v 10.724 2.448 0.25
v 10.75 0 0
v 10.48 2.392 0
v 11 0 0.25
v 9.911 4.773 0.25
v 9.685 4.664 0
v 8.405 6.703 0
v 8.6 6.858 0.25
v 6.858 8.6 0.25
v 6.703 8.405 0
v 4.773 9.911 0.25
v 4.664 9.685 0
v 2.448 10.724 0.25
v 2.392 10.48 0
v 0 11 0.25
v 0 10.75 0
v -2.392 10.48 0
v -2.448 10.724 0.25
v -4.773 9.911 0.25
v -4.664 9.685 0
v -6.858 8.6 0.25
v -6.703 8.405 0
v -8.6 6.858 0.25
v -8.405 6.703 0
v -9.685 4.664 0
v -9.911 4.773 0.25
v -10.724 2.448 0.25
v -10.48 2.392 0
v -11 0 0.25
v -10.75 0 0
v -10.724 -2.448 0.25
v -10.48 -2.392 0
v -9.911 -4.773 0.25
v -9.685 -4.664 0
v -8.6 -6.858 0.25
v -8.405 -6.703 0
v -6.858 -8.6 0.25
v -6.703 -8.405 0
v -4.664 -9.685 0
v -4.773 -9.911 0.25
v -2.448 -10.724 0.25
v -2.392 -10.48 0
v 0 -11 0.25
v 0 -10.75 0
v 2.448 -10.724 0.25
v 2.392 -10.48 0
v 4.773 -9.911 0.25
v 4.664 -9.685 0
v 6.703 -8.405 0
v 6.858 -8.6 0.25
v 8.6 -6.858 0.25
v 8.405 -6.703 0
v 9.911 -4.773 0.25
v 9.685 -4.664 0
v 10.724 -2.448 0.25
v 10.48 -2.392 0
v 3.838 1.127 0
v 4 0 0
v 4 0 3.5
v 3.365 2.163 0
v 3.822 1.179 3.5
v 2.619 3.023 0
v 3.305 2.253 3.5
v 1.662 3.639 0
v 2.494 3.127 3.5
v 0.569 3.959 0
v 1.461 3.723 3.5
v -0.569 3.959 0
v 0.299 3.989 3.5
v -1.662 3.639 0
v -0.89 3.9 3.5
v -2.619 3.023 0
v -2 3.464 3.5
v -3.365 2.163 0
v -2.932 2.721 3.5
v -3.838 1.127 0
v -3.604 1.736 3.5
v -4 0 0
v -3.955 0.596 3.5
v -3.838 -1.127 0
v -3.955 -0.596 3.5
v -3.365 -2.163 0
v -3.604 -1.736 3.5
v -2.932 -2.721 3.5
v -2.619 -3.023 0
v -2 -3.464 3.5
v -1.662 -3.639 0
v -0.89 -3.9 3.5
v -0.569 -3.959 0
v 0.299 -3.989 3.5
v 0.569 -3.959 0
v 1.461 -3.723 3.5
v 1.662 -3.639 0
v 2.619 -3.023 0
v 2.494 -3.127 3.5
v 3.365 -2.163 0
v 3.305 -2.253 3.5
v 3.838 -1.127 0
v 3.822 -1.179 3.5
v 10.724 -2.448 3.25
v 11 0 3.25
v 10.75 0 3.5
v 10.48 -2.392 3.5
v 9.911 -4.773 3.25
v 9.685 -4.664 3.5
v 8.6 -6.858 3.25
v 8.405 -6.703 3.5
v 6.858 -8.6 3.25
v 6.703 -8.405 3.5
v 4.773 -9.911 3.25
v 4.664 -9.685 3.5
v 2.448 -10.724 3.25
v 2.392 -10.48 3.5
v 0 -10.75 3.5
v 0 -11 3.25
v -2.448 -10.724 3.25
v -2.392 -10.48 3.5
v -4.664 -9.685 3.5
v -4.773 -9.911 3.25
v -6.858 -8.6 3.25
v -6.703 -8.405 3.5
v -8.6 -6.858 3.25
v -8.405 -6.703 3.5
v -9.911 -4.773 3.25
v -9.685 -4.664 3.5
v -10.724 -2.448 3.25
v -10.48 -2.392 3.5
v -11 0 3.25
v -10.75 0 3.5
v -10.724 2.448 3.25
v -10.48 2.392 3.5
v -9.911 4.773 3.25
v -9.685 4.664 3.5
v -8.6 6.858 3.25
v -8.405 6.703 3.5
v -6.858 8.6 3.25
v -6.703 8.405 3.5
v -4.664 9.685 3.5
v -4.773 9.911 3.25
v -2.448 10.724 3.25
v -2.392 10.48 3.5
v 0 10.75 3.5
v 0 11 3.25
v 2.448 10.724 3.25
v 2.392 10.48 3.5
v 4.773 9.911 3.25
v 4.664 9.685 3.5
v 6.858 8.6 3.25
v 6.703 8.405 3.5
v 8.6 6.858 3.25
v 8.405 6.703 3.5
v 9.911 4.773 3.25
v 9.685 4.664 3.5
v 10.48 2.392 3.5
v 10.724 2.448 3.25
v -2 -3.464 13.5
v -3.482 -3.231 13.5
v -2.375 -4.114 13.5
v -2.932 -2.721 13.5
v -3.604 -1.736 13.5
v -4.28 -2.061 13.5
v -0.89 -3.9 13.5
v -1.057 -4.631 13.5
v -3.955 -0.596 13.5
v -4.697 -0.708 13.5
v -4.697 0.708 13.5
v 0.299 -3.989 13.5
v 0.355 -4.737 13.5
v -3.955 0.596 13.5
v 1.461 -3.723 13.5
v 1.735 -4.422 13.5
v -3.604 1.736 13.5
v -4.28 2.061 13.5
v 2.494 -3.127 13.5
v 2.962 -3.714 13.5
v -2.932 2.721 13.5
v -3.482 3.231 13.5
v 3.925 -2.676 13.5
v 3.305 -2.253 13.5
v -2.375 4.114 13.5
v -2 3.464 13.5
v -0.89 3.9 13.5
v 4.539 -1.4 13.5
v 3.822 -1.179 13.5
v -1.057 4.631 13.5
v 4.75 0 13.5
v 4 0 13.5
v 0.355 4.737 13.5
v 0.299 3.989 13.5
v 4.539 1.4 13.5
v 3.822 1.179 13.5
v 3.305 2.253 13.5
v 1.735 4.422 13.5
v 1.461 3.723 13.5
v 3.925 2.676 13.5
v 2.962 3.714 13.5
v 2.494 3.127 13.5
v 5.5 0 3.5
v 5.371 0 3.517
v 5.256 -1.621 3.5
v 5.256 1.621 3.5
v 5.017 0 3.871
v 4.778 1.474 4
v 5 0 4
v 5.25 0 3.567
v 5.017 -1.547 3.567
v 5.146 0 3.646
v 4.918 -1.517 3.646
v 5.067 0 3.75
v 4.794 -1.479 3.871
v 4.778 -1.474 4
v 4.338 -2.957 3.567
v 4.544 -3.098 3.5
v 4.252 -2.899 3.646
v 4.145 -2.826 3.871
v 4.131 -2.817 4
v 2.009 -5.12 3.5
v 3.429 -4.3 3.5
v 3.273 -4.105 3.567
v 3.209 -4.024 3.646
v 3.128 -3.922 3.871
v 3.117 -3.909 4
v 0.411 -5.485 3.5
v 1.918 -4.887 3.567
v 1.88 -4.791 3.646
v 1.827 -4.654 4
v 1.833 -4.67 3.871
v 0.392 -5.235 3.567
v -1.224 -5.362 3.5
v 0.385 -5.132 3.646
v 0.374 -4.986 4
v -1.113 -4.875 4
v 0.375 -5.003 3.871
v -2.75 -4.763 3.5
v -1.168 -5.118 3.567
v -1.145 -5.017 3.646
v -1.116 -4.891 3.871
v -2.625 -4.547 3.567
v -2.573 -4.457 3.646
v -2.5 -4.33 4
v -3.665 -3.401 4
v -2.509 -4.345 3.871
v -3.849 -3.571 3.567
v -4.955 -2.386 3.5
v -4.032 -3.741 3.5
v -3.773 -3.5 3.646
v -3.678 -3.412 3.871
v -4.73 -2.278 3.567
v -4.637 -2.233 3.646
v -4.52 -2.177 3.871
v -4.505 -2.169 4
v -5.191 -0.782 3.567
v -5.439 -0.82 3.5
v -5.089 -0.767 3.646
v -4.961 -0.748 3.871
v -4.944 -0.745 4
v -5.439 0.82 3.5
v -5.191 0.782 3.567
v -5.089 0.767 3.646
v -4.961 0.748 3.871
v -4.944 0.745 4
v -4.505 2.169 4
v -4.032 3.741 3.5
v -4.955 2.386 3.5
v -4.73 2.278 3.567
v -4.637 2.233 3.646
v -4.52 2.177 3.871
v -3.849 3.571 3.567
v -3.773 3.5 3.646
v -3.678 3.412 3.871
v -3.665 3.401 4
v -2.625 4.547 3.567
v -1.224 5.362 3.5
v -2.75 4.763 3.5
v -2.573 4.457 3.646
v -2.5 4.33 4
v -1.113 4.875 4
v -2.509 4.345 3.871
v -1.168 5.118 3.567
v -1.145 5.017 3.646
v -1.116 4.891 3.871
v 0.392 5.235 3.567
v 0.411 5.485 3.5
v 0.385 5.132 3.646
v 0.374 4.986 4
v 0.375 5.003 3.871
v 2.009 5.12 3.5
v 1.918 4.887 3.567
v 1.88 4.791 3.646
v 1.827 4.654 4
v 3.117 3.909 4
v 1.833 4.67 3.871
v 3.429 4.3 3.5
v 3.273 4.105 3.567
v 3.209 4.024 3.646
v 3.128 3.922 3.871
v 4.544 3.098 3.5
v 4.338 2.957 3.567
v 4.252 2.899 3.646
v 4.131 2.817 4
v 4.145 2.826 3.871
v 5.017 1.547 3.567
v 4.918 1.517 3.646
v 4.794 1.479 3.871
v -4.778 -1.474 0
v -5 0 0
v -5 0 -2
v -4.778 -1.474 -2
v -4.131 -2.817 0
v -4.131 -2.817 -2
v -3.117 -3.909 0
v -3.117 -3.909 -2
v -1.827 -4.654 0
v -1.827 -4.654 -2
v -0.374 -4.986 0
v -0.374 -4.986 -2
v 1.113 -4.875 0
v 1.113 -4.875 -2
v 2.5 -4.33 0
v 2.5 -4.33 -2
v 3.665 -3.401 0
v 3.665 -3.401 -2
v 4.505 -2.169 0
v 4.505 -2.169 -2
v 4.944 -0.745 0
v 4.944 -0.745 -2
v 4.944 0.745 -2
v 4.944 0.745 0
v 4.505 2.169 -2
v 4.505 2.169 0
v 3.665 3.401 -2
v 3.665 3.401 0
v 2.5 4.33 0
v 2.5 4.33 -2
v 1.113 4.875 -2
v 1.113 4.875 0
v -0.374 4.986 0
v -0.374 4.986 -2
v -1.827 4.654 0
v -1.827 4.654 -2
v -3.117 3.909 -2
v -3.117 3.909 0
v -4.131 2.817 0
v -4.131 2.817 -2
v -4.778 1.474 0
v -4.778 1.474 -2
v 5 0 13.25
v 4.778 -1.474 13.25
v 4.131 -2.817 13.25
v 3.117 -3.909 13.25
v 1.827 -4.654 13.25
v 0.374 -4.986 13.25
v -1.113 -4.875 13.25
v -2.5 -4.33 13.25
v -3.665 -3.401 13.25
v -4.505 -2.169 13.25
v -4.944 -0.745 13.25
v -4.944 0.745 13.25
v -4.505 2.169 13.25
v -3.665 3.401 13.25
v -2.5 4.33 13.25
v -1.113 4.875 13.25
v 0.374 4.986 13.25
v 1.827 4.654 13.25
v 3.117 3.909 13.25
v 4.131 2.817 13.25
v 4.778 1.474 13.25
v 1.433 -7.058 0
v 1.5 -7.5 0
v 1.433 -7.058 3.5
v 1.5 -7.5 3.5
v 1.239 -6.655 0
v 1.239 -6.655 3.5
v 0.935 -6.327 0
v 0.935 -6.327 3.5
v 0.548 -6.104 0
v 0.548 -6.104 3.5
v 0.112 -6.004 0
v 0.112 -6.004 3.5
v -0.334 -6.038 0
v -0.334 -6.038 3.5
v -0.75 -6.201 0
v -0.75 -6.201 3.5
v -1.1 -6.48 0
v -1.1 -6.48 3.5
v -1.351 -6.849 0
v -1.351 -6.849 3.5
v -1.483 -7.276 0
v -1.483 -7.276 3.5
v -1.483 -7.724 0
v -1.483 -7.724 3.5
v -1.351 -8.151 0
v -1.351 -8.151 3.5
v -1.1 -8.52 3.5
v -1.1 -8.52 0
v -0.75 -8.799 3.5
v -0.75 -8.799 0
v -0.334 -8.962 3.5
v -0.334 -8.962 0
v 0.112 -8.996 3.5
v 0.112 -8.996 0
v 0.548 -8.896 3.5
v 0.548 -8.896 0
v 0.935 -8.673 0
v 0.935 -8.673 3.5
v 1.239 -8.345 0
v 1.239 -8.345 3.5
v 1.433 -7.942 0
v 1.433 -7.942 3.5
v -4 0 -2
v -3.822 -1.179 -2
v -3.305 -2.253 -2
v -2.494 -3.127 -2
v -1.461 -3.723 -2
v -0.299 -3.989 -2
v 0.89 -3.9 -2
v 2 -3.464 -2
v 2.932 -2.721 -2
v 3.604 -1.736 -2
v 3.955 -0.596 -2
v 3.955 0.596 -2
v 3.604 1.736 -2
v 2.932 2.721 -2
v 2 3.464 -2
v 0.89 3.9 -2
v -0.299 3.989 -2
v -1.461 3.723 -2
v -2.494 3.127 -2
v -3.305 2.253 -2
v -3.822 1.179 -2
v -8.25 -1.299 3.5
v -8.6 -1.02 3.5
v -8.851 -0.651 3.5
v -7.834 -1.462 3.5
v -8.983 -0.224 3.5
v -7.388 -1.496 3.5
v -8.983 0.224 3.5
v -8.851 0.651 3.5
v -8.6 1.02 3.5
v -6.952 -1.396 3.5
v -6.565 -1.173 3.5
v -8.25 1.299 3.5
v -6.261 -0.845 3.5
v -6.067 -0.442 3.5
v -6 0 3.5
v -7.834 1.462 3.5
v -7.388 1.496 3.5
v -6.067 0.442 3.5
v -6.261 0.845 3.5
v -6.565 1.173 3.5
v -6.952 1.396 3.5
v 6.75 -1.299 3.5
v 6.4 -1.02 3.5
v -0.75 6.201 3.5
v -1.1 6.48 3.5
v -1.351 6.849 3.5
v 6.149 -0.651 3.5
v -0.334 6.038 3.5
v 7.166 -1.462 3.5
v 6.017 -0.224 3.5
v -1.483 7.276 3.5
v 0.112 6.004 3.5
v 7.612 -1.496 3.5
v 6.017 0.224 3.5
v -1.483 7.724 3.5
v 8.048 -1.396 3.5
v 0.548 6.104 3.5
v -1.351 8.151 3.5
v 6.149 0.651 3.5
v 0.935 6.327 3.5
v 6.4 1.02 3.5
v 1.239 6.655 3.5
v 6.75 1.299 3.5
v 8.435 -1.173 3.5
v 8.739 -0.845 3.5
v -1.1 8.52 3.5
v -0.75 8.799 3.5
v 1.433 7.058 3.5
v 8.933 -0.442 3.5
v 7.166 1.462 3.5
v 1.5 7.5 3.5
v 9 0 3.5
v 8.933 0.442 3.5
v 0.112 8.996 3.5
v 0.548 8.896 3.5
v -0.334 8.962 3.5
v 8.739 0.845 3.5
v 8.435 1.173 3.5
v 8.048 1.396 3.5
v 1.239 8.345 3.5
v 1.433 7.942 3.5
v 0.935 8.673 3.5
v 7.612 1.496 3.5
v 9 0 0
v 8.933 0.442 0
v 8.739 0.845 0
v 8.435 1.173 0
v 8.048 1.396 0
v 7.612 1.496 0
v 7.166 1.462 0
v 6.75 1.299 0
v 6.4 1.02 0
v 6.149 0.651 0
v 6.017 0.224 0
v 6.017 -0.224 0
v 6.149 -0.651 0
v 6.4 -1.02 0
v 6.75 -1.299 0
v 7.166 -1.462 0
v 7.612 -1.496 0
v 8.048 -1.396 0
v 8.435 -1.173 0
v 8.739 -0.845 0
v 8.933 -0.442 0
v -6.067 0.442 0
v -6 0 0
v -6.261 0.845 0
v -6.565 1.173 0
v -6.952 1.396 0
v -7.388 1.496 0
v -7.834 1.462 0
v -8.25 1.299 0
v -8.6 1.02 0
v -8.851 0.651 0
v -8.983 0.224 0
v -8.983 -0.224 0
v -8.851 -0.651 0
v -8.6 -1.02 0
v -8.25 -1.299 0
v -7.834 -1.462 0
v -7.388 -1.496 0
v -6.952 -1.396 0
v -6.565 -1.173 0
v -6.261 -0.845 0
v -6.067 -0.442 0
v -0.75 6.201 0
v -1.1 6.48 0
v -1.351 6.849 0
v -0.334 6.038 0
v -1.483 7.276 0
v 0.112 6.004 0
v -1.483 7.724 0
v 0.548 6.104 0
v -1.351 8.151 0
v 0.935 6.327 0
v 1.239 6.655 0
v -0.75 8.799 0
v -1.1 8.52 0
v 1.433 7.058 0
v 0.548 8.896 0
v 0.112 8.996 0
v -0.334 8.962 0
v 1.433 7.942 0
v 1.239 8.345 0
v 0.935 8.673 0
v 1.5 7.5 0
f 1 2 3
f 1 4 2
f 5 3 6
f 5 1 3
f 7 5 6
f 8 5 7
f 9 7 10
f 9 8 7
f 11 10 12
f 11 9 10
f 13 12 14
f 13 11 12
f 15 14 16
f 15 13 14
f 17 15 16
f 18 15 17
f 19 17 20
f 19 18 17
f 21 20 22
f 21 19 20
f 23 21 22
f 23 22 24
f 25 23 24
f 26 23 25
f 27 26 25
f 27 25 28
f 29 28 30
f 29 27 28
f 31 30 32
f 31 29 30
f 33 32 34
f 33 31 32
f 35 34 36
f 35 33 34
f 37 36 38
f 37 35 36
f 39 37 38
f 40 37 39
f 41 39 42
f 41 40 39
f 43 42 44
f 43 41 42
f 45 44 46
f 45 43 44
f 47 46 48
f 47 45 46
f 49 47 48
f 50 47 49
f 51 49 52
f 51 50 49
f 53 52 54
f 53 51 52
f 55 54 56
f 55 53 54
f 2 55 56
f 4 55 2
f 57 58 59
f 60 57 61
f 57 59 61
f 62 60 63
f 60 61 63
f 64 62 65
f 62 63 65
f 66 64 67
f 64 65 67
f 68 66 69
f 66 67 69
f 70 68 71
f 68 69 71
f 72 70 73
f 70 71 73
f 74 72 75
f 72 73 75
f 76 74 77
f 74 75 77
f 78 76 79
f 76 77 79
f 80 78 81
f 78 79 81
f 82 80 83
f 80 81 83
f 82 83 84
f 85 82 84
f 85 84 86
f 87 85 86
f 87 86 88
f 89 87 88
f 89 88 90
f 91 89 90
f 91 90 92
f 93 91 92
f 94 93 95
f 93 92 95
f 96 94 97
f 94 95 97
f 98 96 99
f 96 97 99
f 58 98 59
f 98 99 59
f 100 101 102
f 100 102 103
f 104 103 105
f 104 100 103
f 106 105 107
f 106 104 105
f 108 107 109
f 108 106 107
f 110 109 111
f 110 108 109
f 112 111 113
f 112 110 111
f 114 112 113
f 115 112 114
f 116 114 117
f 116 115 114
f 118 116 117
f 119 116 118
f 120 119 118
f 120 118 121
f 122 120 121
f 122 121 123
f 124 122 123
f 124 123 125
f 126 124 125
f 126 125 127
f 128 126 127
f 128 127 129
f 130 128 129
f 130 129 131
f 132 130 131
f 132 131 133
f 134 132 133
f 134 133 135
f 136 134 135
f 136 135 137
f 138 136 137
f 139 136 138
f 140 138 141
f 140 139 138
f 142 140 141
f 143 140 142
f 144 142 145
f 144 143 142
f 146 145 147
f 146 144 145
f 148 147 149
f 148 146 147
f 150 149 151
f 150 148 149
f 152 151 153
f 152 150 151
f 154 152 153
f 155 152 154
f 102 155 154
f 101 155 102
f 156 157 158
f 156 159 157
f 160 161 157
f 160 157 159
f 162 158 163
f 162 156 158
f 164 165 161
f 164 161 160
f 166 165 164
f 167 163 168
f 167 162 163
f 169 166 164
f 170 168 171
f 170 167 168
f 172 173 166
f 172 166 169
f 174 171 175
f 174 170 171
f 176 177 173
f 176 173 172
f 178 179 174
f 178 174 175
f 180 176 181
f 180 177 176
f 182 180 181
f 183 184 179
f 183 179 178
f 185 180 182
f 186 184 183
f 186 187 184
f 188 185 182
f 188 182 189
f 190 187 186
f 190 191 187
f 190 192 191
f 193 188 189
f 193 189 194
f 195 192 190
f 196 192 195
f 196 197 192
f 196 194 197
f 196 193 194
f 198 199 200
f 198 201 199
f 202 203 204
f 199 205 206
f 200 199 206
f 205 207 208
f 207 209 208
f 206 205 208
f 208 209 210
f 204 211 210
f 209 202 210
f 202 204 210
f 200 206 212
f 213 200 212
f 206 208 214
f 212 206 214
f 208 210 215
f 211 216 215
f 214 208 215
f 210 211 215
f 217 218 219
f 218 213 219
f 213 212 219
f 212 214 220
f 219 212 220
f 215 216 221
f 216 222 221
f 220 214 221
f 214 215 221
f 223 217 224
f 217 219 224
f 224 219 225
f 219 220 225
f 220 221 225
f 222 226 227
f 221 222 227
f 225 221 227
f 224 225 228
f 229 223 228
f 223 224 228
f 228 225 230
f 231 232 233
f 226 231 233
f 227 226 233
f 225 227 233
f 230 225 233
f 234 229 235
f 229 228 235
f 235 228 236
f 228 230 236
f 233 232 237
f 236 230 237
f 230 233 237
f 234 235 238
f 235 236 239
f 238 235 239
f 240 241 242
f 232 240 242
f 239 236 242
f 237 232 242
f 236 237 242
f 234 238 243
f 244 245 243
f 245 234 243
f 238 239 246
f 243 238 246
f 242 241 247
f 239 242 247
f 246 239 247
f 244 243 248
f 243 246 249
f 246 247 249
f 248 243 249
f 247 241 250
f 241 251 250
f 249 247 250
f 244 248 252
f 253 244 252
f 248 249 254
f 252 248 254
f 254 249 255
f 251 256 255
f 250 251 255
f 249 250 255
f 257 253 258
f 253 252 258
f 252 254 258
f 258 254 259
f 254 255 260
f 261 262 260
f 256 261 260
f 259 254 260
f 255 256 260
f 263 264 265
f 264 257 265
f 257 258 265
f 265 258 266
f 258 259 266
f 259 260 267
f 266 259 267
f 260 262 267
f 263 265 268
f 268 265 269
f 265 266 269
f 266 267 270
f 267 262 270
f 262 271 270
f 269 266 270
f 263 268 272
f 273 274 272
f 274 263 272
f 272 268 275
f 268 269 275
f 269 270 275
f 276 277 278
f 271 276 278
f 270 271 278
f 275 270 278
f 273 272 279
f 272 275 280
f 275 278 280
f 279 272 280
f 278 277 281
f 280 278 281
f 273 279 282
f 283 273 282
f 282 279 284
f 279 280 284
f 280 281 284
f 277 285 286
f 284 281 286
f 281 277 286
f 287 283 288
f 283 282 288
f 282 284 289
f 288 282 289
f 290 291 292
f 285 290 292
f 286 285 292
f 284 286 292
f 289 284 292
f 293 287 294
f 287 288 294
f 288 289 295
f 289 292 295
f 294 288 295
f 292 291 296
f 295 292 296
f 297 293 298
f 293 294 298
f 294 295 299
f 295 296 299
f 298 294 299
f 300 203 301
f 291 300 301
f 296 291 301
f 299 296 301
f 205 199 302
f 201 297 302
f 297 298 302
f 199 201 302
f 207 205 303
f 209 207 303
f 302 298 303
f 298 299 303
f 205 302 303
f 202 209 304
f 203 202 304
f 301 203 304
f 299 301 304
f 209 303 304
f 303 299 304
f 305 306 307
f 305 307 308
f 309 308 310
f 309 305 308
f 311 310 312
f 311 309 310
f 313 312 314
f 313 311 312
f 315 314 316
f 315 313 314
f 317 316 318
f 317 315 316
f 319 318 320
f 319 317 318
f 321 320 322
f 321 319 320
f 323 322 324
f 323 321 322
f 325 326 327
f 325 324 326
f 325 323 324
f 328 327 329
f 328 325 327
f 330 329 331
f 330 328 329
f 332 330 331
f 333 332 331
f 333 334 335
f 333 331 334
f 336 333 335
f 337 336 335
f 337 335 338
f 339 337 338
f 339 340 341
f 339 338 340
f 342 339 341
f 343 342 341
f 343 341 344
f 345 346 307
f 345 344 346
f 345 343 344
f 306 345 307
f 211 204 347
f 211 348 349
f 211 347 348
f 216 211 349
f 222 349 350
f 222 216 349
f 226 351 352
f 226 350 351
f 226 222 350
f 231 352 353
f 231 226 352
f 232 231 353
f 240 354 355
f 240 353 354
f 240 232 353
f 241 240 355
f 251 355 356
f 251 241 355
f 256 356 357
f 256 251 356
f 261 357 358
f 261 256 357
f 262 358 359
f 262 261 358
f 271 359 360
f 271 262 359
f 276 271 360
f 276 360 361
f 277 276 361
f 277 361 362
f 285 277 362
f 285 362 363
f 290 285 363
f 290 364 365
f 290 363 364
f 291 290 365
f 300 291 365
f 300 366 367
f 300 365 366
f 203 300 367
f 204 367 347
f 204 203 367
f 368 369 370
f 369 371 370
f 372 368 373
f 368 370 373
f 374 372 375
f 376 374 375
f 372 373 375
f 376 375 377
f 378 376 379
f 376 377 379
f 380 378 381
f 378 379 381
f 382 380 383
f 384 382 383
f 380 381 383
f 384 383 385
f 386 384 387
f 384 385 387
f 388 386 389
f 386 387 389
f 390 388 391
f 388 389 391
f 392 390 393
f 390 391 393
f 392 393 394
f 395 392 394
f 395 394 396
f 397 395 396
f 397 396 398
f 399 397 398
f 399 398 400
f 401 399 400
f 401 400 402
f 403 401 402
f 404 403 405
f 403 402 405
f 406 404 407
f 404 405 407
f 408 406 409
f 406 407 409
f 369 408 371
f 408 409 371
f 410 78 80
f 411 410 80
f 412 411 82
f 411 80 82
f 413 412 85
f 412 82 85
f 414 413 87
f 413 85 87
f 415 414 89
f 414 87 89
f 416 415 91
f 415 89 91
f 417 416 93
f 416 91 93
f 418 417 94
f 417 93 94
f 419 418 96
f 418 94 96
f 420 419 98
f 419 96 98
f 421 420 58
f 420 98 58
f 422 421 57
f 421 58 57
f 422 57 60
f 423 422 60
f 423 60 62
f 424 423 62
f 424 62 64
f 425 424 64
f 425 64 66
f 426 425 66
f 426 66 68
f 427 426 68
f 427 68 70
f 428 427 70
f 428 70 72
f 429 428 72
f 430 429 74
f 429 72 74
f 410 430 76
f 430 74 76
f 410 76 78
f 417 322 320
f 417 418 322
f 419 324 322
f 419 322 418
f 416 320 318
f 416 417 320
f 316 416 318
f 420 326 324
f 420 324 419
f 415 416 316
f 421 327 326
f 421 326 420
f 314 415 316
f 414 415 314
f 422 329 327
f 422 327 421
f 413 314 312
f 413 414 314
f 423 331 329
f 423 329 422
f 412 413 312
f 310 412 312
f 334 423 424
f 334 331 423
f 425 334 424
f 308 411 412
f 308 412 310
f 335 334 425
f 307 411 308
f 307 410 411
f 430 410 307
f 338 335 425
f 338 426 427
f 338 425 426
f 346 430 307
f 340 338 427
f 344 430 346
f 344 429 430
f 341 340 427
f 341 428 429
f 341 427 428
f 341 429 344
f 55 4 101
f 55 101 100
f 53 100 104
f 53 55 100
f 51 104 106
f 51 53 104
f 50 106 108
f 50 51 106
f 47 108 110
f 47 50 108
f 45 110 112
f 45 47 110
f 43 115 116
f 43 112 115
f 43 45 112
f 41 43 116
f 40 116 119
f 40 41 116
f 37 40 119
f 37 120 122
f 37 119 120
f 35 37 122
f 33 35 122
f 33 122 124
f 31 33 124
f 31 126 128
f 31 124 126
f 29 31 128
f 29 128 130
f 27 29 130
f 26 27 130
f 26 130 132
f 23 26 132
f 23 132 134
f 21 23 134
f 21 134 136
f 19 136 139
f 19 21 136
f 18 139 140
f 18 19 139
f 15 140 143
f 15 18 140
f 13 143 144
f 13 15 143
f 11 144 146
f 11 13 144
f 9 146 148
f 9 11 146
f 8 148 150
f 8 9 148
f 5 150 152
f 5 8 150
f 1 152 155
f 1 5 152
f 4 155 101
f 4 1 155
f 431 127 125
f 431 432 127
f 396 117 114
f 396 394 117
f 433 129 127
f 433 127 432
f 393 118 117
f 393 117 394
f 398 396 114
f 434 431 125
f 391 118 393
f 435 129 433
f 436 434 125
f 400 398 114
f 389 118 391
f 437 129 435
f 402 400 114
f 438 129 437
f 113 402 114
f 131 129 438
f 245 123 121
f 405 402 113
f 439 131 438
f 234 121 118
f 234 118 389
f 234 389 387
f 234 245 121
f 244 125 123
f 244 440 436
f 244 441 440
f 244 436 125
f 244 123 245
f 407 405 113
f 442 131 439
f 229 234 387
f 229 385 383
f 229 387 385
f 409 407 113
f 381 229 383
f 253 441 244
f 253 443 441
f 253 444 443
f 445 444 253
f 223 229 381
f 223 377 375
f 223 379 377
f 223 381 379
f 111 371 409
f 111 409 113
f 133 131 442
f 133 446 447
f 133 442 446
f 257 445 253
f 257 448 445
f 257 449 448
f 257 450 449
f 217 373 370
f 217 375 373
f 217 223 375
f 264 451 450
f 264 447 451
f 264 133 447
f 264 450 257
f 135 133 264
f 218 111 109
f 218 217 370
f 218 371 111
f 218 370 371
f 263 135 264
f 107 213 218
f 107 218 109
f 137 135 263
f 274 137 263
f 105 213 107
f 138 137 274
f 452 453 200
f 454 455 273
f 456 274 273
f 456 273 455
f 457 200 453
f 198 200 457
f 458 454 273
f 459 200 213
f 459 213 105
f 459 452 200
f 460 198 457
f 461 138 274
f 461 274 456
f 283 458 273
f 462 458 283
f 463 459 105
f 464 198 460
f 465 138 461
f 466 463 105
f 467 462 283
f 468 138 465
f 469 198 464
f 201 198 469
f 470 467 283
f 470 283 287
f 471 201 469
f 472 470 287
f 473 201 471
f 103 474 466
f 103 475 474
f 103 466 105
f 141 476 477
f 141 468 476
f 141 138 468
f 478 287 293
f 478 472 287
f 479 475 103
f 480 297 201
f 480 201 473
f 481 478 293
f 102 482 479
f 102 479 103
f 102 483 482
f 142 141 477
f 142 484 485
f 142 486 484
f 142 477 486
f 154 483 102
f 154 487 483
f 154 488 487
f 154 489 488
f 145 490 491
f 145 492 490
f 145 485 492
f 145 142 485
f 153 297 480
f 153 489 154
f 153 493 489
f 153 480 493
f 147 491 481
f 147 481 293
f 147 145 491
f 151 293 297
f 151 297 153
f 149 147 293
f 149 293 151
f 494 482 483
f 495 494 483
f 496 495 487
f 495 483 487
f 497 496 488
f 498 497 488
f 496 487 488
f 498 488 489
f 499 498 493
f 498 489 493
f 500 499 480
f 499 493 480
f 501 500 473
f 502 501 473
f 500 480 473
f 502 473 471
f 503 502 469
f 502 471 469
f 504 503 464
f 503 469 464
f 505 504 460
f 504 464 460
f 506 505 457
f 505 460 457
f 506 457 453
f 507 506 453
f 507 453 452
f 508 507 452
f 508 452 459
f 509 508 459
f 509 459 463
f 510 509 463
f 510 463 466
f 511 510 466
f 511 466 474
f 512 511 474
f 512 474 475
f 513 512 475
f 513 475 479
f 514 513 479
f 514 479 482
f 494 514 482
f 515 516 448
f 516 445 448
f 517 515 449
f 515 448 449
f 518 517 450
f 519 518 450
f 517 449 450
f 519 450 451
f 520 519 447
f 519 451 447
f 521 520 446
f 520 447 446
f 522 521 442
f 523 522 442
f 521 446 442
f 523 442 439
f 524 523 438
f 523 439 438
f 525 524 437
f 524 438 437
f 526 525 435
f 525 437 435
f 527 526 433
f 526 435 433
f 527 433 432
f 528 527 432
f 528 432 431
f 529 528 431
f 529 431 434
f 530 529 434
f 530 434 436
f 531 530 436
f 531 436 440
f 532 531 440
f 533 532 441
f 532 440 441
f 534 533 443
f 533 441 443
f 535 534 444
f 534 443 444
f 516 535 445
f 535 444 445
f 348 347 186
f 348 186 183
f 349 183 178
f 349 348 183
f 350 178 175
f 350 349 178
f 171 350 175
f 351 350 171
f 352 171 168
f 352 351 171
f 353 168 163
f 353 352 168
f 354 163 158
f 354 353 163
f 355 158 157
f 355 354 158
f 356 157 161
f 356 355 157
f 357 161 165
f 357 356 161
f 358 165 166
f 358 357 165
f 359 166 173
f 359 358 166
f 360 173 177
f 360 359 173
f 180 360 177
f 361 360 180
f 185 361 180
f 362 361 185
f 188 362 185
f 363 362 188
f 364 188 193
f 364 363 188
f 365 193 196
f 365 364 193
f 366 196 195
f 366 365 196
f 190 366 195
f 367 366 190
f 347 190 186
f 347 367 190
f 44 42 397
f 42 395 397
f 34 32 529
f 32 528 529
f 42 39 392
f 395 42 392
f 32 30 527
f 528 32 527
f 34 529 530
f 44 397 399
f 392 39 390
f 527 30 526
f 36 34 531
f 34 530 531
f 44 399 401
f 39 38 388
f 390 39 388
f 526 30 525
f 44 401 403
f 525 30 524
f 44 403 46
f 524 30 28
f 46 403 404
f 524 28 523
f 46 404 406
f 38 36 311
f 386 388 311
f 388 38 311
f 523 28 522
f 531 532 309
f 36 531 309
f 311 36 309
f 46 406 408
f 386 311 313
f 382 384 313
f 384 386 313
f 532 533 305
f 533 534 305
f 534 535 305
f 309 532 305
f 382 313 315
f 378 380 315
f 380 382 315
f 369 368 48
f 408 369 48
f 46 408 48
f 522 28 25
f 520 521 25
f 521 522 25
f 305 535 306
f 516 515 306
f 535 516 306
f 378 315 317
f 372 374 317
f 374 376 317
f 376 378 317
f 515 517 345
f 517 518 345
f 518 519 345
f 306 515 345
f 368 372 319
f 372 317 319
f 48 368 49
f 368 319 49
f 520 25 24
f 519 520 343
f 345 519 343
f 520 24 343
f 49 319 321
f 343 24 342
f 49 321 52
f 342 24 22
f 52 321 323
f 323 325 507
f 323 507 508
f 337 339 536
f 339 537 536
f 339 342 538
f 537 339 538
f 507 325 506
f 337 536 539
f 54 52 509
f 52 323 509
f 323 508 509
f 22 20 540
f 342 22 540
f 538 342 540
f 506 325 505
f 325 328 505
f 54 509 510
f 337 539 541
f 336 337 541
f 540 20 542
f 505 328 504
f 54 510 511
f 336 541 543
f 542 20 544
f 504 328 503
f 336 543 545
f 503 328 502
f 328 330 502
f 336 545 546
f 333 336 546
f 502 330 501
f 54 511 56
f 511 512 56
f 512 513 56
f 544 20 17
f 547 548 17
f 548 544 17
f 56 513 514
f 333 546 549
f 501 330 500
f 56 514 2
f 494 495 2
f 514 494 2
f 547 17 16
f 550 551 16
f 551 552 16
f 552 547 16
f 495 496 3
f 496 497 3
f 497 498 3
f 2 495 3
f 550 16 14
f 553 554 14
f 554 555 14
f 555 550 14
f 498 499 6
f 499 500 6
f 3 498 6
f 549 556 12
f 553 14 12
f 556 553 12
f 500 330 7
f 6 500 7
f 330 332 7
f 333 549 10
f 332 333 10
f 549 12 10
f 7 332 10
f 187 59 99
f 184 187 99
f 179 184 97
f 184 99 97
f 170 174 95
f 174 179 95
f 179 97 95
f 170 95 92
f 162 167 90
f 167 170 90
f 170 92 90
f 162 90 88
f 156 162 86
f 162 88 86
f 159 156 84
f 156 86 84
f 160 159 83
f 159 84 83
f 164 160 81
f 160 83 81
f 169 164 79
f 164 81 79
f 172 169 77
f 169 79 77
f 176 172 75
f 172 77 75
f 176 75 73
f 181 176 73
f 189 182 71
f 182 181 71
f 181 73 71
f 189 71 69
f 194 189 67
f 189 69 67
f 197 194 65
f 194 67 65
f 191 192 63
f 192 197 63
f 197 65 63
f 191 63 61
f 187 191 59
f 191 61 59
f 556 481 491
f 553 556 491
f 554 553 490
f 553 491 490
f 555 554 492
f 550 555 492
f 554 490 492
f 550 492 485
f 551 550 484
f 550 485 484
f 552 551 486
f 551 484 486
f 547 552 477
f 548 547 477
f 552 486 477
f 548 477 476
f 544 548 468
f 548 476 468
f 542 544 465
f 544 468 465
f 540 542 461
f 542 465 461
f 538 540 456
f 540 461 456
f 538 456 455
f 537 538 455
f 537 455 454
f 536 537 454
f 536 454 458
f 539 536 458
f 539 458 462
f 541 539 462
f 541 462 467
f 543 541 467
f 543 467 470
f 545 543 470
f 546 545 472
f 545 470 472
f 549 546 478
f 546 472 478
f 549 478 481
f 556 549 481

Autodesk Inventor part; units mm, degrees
ref_plane "YZ Plane" through (0, 0, 0) normal (1, 0, 0) x (0, 1, 0)
ref_plane "XZ Plane" through (0, 0, 0) normal (0, 1, 0) x (-1, 0, 0)
ref_plane "XY Plane" through (0, 0, 0) normal (0, 0, 1) x (1, 0, 0)
sketch "Sketch1" plane through (0, 0, 0) normal (0, 0, 1) x (1, 0, 0)
  circle A0 centre (0, 0) radius 11
  dimension "d0" = 22
extrude "Extrusion1" add sketch "Sketch1" along normal blind 3.5
sketch "Sketch2" plane through (0, 0, 3.5) normal (0, 0, 1) x (1, 0, 0)
  circle A0 centre (0, 0) radius 5
  circle A1 centre (0, 0) radius 4
  dimension "d3" = 10
  dimension "d4" = 8
extrude "Extrusion2" add sketch "Sketch2" along normal blind 10
sketch "Sketch3" plane through (0, 0, 3.5) normal (0, 0, 1) x (1, 0, 0)
  circle A0 centre (0, 0) radius 4
  dimension "d7" = 8
extrude "Extrusion3" cut sketch "Sketch3" against normal blind 10
sketch "Sketch4" plane through (0, 0, 0) normal (0, 0, -1) x (-1, 0, 0)
  circle A0 centre (0, 0) radius 4 projected
  circle A1 centre (0, 0) radius 5
  dimension "d10" = 10
extrude "Extrusion4" add sketch "Sketch4" along normal blind 2
fillet "Fillet1" radius 0.5 1 edges at (-5, 0, 3.5)
chamfer "Chamfer1" distance 0.25 angle 45 1 edges at (-5, 0, 13.5)
chamfer "Chamfer2" distance 0.25 angle 45 2 edges at (-11, 0, 3.5) (-11, 0, 0)
sketch "Sketch5" plane through (0, 0, 3.5) normal (0, 0, 1) x (1, 0, 0)
  circle A0 centre (0, 0) radius 11 construction
  circle A1 centre (0, 0) radius 7.5 construction
  circle A2 centre (0, 7.5) radius 1.5 construction
  circle A3 centre (0, 7.5) radius 1.5
  circle A4 centre (-7.5, 0) radius 1.5 construction
  circle A5 centre (-7.5, 0) radius 1.5
  circle A6 centre (0, -7.5) radius 1.5 construction
  circle A7 centre (0, -7.5) radius 1.5
  circle A8 centre (7.5, 0) radius 1.5 construction
  circle A9 centre (7.5, 0) radius 1.5
  dimension "d21" = 15
  dimension "d20" = 22
  dimension "d22" = 3
  dimension "d25" = 360
extrude "Extrusion5" cut sketch "Sketch5" against normal through all
thread "Thread1" size "M8x1.25" class "6H" standard "ANSI Metric M Profile" full length
properties part number "Tuerca_Tornillo de potencia"
